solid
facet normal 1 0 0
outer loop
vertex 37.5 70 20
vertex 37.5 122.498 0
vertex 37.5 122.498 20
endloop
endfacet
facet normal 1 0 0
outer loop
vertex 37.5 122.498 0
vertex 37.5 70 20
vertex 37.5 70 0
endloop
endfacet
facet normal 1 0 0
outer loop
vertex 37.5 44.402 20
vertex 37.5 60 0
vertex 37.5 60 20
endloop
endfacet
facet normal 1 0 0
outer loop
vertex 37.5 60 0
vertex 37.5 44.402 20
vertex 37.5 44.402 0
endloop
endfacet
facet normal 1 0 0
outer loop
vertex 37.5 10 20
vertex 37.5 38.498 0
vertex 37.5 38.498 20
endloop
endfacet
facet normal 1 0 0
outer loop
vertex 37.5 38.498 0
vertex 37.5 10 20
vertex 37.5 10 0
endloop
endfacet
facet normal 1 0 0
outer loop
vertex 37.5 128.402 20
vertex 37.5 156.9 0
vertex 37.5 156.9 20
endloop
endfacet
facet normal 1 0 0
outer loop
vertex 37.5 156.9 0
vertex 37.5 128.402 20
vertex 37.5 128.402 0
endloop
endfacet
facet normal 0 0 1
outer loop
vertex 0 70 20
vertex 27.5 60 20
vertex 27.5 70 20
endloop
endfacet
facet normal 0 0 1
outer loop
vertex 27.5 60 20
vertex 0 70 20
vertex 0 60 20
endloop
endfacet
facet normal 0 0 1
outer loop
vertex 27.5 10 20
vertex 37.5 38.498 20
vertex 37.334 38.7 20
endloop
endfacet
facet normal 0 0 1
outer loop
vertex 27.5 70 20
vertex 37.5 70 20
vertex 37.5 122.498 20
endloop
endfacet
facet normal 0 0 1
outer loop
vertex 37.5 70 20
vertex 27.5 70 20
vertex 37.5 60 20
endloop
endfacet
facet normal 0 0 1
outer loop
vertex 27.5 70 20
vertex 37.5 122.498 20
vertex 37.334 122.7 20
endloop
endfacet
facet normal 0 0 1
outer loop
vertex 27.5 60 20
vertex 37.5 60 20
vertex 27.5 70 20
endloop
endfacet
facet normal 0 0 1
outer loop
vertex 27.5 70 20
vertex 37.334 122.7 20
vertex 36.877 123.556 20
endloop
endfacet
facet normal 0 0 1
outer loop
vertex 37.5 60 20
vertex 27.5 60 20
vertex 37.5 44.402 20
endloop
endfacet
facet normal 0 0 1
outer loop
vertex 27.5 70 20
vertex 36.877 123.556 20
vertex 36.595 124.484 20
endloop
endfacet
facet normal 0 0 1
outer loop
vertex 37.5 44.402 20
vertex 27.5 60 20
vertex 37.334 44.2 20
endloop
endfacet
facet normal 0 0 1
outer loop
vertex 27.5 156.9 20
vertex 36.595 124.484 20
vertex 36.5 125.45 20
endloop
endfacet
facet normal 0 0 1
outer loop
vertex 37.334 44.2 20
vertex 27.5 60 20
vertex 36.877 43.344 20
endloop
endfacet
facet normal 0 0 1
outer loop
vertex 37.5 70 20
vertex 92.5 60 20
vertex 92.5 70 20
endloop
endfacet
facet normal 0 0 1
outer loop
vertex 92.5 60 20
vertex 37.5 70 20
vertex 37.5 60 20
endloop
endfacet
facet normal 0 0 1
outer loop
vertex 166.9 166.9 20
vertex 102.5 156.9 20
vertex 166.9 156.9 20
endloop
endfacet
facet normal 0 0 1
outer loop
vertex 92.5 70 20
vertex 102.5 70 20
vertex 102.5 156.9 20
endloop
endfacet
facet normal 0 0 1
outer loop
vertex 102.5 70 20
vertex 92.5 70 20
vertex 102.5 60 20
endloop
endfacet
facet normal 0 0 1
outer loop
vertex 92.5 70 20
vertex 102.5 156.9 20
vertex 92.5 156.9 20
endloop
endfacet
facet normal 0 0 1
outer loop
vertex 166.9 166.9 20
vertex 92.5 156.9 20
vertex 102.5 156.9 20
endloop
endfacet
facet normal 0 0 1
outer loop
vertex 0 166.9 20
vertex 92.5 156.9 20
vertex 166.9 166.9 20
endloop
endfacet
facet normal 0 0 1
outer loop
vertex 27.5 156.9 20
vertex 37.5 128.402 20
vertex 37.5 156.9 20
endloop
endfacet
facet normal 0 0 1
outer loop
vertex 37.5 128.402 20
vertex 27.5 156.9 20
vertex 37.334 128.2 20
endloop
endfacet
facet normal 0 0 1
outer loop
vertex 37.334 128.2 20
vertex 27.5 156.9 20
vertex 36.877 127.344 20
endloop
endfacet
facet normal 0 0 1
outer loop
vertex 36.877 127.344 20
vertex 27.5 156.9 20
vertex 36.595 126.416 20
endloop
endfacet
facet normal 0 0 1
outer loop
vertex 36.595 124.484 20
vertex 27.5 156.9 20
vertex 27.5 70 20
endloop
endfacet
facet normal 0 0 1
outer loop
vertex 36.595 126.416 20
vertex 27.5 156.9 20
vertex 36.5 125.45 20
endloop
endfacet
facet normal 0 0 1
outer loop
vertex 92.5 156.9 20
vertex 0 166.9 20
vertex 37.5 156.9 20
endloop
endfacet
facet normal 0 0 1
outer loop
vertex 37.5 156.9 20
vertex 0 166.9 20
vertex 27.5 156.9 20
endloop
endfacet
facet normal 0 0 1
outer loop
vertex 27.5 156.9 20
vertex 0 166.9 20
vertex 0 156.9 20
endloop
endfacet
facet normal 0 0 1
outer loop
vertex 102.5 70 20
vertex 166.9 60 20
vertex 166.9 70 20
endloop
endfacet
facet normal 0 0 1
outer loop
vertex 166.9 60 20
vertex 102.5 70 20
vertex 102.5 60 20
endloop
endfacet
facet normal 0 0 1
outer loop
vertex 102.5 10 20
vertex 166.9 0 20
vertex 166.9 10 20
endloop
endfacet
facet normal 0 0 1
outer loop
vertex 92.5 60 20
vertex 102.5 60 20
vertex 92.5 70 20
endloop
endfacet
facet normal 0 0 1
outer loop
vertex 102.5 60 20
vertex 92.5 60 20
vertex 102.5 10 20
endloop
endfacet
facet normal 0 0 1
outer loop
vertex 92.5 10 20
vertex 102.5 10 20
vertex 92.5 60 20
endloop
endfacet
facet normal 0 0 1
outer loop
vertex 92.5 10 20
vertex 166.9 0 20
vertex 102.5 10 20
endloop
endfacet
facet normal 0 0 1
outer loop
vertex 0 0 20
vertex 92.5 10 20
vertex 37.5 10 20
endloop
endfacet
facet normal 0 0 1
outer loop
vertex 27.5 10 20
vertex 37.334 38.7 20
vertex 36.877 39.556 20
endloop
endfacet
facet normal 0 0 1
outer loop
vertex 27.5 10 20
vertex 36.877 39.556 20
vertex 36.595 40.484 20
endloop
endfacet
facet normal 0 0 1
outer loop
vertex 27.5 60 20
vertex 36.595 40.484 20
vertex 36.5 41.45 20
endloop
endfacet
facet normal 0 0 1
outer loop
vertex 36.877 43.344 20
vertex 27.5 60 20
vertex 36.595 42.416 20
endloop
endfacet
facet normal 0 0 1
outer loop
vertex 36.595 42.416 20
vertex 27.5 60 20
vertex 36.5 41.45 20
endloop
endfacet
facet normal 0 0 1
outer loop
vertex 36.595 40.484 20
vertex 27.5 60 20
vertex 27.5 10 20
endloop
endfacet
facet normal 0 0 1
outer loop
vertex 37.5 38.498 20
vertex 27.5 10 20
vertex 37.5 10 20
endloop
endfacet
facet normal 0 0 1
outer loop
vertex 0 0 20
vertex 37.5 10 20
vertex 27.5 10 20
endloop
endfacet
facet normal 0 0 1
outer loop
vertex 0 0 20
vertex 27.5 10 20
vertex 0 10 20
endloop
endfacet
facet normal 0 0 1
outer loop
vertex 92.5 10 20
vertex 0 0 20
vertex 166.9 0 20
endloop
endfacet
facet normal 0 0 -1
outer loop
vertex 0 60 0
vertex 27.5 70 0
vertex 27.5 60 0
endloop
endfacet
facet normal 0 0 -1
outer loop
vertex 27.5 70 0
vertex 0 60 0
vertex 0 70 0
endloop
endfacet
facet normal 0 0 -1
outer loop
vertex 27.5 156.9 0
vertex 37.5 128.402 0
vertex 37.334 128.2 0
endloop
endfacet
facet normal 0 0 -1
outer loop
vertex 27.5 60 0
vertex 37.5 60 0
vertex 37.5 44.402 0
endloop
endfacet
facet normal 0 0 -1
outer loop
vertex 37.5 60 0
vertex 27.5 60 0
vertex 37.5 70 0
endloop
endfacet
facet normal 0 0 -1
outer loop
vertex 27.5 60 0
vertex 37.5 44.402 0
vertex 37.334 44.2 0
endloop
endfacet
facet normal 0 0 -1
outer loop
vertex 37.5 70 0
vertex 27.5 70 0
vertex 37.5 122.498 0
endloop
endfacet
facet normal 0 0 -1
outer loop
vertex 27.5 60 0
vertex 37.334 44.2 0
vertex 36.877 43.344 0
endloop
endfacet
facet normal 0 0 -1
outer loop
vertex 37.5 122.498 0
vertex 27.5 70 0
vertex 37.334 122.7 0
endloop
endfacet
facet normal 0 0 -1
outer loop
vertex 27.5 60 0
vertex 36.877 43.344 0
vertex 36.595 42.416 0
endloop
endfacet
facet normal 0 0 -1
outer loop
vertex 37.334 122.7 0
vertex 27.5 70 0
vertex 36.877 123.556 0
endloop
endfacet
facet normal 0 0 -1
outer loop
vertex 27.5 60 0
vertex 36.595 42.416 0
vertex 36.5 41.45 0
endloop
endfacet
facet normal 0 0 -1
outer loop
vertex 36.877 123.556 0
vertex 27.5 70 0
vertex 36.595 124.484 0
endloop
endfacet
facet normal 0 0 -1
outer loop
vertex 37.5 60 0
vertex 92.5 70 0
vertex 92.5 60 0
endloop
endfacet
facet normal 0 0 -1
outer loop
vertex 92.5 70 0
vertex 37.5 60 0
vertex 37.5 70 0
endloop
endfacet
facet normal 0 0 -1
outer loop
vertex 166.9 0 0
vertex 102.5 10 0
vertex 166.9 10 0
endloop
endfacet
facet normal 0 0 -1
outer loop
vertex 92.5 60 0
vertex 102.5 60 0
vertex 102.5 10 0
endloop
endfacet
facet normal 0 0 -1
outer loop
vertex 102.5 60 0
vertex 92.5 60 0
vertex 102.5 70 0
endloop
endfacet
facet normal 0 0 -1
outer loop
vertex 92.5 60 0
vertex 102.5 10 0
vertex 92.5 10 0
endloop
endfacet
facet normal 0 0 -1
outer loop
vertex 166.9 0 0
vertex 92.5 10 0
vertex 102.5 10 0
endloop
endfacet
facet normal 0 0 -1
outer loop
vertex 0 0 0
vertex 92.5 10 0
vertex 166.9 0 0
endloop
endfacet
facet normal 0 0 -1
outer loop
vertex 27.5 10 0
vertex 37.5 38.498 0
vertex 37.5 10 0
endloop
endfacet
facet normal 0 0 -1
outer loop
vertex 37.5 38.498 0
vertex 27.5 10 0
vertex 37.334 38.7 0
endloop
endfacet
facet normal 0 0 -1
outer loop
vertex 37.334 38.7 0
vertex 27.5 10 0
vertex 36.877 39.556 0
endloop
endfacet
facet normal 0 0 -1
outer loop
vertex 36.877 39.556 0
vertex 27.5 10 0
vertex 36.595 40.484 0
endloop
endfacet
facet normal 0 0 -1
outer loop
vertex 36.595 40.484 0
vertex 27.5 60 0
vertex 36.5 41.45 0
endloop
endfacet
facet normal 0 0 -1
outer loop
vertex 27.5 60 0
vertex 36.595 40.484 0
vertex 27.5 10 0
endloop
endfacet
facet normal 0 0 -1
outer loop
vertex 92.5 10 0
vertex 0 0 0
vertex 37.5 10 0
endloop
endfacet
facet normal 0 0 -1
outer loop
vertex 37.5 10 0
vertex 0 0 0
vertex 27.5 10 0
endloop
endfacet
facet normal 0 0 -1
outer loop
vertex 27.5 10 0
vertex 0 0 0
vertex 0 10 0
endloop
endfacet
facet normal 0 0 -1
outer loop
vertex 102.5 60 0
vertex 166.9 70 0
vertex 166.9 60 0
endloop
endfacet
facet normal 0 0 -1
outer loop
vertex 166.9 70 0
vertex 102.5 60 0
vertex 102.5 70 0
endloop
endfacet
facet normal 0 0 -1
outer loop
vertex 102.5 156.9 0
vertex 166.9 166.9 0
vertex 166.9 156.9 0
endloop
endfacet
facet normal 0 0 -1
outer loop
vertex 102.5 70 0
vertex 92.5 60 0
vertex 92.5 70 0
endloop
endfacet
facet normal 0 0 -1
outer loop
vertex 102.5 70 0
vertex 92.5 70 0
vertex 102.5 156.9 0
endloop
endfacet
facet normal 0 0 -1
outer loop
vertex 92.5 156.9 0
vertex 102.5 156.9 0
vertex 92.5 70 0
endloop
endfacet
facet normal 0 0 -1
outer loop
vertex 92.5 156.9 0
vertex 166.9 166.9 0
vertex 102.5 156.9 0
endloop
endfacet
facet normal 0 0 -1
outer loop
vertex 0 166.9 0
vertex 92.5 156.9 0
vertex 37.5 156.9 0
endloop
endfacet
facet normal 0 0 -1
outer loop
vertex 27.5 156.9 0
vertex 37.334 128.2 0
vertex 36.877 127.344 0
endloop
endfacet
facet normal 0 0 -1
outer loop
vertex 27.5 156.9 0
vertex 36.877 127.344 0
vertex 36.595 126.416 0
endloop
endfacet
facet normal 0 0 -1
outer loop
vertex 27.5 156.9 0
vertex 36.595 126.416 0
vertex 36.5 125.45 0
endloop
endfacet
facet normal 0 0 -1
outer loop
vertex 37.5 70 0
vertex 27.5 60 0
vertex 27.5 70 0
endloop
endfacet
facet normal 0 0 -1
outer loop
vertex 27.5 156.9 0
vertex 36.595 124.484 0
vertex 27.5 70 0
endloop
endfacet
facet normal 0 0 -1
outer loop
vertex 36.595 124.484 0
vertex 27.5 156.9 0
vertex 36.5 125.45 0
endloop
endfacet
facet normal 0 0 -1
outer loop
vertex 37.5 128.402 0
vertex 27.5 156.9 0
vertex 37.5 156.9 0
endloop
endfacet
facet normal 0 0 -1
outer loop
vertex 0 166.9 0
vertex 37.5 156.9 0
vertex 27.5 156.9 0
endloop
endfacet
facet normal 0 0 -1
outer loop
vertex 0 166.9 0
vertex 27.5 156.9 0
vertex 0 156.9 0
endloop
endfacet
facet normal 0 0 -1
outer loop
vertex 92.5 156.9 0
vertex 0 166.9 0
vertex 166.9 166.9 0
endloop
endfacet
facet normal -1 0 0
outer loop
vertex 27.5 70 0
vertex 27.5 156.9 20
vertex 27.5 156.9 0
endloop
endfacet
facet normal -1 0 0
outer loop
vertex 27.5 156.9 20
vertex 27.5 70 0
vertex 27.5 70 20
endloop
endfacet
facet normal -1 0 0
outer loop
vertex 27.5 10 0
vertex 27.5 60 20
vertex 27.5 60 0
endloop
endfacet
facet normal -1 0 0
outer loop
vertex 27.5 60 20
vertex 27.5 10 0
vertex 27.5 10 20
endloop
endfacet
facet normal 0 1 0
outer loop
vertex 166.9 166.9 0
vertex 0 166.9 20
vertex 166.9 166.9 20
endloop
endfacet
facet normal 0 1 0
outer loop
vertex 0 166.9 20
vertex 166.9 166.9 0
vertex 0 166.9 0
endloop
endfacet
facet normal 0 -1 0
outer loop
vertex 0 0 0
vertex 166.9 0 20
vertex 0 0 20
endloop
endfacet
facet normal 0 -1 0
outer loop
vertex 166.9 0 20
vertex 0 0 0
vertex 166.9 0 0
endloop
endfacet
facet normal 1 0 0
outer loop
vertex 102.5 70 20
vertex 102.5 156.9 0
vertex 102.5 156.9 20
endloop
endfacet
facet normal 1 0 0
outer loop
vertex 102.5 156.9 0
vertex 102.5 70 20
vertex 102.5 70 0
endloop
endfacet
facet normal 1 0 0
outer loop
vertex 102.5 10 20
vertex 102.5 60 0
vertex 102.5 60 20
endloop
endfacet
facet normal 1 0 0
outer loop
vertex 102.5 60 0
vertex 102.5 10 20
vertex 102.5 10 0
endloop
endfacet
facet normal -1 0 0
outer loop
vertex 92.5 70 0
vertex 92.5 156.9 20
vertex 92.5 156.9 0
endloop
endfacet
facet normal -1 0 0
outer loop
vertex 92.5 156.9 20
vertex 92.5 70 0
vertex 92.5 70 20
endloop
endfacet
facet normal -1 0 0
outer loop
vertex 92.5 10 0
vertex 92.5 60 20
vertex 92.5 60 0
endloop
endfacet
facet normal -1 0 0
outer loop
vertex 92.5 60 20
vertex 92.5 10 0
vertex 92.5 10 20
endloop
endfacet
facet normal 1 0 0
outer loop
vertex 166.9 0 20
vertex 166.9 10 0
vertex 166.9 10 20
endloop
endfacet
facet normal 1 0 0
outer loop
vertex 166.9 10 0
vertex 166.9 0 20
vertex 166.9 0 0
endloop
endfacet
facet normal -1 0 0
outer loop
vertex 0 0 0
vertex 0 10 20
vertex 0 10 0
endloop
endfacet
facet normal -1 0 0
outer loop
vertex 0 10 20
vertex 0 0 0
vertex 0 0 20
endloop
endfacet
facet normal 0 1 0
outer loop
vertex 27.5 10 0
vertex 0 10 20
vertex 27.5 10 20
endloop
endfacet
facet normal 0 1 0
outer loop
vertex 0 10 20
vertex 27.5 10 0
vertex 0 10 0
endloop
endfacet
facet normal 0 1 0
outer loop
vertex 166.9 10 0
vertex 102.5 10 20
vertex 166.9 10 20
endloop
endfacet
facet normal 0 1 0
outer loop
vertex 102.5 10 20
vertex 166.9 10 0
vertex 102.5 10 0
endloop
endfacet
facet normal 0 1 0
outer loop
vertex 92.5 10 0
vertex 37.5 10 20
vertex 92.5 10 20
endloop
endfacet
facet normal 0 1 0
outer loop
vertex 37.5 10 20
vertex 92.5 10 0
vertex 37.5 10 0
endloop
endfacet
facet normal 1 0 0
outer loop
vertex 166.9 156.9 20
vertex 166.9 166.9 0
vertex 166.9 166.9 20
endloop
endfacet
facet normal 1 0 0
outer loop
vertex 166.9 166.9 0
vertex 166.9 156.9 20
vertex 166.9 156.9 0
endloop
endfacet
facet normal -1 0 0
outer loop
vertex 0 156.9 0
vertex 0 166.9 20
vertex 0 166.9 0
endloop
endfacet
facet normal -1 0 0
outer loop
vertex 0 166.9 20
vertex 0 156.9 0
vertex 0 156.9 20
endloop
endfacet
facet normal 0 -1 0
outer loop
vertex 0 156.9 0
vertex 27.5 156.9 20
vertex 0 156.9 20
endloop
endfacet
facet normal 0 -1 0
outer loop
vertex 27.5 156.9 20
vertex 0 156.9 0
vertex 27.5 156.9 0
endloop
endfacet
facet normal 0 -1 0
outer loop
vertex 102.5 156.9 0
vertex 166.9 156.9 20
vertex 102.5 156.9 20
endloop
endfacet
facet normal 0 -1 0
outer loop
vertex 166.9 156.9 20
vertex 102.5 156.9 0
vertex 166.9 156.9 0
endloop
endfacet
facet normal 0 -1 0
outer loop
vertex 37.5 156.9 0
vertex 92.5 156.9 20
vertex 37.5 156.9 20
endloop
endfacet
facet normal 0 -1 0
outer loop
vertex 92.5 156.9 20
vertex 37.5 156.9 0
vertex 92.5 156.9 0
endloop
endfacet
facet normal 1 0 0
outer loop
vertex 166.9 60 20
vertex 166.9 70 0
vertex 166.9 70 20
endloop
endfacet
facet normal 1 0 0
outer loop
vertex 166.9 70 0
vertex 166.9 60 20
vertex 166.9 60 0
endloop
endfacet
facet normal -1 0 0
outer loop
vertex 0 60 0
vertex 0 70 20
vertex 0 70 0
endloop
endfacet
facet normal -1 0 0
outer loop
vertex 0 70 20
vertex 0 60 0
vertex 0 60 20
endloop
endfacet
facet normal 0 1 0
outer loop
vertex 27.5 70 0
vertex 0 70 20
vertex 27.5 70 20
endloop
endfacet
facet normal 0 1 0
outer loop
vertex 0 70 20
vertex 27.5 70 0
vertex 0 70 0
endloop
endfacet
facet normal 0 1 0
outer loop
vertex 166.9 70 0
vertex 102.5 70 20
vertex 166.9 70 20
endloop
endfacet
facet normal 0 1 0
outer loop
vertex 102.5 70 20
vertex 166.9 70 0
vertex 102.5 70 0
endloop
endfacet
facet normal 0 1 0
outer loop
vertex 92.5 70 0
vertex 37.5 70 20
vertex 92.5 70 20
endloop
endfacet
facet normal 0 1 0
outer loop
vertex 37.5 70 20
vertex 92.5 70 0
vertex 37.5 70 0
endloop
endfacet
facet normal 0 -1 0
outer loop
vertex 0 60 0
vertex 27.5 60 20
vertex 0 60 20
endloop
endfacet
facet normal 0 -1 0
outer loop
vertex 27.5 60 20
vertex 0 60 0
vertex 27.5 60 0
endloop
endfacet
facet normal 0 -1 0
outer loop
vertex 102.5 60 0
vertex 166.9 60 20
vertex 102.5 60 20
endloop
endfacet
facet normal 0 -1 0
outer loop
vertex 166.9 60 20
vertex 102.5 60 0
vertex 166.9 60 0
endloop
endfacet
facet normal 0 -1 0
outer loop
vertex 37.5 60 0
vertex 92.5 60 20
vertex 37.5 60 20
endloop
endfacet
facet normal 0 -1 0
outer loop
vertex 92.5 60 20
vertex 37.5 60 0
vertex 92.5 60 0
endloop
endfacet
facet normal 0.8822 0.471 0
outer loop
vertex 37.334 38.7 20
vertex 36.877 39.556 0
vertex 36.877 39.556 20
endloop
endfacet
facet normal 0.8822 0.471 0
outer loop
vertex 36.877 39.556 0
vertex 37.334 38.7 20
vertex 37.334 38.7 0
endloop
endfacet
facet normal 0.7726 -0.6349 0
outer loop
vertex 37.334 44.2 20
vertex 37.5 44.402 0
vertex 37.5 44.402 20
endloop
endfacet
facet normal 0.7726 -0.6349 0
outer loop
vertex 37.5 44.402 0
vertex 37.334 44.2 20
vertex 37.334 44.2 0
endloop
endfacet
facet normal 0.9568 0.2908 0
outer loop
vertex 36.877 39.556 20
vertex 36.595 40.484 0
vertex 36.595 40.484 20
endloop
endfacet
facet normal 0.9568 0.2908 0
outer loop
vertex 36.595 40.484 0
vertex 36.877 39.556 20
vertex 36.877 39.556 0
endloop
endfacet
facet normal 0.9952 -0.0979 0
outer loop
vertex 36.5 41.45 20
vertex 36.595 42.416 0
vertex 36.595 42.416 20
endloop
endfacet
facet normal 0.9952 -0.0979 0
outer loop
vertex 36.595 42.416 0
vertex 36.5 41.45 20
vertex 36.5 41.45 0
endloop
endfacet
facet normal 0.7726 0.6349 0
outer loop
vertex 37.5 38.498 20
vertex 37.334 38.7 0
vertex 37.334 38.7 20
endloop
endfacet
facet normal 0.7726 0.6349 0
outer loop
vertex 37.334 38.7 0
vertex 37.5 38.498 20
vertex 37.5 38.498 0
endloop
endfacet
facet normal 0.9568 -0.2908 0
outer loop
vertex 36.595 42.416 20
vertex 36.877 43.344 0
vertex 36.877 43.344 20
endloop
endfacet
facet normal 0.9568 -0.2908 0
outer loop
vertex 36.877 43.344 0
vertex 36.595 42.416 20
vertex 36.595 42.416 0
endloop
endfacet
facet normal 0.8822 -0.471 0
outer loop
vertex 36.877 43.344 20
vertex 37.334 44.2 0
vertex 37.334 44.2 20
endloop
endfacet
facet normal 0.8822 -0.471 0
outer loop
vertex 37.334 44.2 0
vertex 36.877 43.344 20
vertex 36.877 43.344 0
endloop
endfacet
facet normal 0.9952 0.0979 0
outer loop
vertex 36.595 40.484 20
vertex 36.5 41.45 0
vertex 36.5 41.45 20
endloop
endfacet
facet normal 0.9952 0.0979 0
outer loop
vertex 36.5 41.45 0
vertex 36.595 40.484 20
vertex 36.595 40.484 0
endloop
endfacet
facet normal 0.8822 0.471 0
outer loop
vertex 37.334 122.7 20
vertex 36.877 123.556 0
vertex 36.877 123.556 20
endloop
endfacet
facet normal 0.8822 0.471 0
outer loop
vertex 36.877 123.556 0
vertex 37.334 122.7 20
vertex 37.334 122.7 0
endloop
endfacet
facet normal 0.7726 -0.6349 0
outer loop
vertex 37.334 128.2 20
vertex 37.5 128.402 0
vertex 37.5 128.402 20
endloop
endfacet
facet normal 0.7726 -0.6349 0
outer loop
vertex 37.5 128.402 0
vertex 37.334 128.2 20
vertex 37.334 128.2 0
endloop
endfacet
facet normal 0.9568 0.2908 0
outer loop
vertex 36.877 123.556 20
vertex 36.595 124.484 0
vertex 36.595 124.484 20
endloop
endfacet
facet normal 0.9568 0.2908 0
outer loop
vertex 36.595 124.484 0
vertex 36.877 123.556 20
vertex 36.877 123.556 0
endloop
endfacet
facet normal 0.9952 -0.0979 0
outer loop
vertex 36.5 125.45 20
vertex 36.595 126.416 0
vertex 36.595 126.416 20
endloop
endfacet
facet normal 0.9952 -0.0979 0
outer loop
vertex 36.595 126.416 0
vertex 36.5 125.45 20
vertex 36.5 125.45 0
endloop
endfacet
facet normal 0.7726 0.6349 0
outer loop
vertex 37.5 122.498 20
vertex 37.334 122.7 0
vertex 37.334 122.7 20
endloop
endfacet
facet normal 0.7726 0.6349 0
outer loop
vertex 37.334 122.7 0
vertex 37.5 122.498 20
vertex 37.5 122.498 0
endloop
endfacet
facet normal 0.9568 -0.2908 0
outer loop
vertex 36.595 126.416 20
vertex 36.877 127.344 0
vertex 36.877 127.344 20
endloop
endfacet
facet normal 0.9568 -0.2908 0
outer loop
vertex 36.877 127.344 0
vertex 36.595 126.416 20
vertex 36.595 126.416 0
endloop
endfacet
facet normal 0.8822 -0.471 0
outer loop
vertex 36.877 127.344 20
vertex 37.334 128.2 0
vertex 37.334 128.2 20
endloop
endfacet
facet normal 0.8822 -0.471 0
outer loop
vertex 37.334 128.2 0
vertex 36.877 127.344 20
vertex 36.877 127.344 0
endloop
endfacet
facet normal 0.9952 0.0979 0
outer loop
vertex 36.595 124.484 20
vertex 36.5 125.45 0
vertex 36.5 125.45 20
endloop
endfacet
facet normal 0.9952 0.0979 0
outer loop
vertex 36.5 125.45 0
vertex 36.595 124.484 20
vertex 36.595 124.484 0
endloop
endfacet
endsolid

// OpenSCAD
/*
Bottom spacer ladder with through drain holes.
Print orientation: print flat as shown. During assembly it sits between the bottom
outer skin and bottom liner to set the foam gap.
Quantity: one per bottom tile sandwich.
*/

use <../planter_support_free.scad>

export_bottom_spacer();
